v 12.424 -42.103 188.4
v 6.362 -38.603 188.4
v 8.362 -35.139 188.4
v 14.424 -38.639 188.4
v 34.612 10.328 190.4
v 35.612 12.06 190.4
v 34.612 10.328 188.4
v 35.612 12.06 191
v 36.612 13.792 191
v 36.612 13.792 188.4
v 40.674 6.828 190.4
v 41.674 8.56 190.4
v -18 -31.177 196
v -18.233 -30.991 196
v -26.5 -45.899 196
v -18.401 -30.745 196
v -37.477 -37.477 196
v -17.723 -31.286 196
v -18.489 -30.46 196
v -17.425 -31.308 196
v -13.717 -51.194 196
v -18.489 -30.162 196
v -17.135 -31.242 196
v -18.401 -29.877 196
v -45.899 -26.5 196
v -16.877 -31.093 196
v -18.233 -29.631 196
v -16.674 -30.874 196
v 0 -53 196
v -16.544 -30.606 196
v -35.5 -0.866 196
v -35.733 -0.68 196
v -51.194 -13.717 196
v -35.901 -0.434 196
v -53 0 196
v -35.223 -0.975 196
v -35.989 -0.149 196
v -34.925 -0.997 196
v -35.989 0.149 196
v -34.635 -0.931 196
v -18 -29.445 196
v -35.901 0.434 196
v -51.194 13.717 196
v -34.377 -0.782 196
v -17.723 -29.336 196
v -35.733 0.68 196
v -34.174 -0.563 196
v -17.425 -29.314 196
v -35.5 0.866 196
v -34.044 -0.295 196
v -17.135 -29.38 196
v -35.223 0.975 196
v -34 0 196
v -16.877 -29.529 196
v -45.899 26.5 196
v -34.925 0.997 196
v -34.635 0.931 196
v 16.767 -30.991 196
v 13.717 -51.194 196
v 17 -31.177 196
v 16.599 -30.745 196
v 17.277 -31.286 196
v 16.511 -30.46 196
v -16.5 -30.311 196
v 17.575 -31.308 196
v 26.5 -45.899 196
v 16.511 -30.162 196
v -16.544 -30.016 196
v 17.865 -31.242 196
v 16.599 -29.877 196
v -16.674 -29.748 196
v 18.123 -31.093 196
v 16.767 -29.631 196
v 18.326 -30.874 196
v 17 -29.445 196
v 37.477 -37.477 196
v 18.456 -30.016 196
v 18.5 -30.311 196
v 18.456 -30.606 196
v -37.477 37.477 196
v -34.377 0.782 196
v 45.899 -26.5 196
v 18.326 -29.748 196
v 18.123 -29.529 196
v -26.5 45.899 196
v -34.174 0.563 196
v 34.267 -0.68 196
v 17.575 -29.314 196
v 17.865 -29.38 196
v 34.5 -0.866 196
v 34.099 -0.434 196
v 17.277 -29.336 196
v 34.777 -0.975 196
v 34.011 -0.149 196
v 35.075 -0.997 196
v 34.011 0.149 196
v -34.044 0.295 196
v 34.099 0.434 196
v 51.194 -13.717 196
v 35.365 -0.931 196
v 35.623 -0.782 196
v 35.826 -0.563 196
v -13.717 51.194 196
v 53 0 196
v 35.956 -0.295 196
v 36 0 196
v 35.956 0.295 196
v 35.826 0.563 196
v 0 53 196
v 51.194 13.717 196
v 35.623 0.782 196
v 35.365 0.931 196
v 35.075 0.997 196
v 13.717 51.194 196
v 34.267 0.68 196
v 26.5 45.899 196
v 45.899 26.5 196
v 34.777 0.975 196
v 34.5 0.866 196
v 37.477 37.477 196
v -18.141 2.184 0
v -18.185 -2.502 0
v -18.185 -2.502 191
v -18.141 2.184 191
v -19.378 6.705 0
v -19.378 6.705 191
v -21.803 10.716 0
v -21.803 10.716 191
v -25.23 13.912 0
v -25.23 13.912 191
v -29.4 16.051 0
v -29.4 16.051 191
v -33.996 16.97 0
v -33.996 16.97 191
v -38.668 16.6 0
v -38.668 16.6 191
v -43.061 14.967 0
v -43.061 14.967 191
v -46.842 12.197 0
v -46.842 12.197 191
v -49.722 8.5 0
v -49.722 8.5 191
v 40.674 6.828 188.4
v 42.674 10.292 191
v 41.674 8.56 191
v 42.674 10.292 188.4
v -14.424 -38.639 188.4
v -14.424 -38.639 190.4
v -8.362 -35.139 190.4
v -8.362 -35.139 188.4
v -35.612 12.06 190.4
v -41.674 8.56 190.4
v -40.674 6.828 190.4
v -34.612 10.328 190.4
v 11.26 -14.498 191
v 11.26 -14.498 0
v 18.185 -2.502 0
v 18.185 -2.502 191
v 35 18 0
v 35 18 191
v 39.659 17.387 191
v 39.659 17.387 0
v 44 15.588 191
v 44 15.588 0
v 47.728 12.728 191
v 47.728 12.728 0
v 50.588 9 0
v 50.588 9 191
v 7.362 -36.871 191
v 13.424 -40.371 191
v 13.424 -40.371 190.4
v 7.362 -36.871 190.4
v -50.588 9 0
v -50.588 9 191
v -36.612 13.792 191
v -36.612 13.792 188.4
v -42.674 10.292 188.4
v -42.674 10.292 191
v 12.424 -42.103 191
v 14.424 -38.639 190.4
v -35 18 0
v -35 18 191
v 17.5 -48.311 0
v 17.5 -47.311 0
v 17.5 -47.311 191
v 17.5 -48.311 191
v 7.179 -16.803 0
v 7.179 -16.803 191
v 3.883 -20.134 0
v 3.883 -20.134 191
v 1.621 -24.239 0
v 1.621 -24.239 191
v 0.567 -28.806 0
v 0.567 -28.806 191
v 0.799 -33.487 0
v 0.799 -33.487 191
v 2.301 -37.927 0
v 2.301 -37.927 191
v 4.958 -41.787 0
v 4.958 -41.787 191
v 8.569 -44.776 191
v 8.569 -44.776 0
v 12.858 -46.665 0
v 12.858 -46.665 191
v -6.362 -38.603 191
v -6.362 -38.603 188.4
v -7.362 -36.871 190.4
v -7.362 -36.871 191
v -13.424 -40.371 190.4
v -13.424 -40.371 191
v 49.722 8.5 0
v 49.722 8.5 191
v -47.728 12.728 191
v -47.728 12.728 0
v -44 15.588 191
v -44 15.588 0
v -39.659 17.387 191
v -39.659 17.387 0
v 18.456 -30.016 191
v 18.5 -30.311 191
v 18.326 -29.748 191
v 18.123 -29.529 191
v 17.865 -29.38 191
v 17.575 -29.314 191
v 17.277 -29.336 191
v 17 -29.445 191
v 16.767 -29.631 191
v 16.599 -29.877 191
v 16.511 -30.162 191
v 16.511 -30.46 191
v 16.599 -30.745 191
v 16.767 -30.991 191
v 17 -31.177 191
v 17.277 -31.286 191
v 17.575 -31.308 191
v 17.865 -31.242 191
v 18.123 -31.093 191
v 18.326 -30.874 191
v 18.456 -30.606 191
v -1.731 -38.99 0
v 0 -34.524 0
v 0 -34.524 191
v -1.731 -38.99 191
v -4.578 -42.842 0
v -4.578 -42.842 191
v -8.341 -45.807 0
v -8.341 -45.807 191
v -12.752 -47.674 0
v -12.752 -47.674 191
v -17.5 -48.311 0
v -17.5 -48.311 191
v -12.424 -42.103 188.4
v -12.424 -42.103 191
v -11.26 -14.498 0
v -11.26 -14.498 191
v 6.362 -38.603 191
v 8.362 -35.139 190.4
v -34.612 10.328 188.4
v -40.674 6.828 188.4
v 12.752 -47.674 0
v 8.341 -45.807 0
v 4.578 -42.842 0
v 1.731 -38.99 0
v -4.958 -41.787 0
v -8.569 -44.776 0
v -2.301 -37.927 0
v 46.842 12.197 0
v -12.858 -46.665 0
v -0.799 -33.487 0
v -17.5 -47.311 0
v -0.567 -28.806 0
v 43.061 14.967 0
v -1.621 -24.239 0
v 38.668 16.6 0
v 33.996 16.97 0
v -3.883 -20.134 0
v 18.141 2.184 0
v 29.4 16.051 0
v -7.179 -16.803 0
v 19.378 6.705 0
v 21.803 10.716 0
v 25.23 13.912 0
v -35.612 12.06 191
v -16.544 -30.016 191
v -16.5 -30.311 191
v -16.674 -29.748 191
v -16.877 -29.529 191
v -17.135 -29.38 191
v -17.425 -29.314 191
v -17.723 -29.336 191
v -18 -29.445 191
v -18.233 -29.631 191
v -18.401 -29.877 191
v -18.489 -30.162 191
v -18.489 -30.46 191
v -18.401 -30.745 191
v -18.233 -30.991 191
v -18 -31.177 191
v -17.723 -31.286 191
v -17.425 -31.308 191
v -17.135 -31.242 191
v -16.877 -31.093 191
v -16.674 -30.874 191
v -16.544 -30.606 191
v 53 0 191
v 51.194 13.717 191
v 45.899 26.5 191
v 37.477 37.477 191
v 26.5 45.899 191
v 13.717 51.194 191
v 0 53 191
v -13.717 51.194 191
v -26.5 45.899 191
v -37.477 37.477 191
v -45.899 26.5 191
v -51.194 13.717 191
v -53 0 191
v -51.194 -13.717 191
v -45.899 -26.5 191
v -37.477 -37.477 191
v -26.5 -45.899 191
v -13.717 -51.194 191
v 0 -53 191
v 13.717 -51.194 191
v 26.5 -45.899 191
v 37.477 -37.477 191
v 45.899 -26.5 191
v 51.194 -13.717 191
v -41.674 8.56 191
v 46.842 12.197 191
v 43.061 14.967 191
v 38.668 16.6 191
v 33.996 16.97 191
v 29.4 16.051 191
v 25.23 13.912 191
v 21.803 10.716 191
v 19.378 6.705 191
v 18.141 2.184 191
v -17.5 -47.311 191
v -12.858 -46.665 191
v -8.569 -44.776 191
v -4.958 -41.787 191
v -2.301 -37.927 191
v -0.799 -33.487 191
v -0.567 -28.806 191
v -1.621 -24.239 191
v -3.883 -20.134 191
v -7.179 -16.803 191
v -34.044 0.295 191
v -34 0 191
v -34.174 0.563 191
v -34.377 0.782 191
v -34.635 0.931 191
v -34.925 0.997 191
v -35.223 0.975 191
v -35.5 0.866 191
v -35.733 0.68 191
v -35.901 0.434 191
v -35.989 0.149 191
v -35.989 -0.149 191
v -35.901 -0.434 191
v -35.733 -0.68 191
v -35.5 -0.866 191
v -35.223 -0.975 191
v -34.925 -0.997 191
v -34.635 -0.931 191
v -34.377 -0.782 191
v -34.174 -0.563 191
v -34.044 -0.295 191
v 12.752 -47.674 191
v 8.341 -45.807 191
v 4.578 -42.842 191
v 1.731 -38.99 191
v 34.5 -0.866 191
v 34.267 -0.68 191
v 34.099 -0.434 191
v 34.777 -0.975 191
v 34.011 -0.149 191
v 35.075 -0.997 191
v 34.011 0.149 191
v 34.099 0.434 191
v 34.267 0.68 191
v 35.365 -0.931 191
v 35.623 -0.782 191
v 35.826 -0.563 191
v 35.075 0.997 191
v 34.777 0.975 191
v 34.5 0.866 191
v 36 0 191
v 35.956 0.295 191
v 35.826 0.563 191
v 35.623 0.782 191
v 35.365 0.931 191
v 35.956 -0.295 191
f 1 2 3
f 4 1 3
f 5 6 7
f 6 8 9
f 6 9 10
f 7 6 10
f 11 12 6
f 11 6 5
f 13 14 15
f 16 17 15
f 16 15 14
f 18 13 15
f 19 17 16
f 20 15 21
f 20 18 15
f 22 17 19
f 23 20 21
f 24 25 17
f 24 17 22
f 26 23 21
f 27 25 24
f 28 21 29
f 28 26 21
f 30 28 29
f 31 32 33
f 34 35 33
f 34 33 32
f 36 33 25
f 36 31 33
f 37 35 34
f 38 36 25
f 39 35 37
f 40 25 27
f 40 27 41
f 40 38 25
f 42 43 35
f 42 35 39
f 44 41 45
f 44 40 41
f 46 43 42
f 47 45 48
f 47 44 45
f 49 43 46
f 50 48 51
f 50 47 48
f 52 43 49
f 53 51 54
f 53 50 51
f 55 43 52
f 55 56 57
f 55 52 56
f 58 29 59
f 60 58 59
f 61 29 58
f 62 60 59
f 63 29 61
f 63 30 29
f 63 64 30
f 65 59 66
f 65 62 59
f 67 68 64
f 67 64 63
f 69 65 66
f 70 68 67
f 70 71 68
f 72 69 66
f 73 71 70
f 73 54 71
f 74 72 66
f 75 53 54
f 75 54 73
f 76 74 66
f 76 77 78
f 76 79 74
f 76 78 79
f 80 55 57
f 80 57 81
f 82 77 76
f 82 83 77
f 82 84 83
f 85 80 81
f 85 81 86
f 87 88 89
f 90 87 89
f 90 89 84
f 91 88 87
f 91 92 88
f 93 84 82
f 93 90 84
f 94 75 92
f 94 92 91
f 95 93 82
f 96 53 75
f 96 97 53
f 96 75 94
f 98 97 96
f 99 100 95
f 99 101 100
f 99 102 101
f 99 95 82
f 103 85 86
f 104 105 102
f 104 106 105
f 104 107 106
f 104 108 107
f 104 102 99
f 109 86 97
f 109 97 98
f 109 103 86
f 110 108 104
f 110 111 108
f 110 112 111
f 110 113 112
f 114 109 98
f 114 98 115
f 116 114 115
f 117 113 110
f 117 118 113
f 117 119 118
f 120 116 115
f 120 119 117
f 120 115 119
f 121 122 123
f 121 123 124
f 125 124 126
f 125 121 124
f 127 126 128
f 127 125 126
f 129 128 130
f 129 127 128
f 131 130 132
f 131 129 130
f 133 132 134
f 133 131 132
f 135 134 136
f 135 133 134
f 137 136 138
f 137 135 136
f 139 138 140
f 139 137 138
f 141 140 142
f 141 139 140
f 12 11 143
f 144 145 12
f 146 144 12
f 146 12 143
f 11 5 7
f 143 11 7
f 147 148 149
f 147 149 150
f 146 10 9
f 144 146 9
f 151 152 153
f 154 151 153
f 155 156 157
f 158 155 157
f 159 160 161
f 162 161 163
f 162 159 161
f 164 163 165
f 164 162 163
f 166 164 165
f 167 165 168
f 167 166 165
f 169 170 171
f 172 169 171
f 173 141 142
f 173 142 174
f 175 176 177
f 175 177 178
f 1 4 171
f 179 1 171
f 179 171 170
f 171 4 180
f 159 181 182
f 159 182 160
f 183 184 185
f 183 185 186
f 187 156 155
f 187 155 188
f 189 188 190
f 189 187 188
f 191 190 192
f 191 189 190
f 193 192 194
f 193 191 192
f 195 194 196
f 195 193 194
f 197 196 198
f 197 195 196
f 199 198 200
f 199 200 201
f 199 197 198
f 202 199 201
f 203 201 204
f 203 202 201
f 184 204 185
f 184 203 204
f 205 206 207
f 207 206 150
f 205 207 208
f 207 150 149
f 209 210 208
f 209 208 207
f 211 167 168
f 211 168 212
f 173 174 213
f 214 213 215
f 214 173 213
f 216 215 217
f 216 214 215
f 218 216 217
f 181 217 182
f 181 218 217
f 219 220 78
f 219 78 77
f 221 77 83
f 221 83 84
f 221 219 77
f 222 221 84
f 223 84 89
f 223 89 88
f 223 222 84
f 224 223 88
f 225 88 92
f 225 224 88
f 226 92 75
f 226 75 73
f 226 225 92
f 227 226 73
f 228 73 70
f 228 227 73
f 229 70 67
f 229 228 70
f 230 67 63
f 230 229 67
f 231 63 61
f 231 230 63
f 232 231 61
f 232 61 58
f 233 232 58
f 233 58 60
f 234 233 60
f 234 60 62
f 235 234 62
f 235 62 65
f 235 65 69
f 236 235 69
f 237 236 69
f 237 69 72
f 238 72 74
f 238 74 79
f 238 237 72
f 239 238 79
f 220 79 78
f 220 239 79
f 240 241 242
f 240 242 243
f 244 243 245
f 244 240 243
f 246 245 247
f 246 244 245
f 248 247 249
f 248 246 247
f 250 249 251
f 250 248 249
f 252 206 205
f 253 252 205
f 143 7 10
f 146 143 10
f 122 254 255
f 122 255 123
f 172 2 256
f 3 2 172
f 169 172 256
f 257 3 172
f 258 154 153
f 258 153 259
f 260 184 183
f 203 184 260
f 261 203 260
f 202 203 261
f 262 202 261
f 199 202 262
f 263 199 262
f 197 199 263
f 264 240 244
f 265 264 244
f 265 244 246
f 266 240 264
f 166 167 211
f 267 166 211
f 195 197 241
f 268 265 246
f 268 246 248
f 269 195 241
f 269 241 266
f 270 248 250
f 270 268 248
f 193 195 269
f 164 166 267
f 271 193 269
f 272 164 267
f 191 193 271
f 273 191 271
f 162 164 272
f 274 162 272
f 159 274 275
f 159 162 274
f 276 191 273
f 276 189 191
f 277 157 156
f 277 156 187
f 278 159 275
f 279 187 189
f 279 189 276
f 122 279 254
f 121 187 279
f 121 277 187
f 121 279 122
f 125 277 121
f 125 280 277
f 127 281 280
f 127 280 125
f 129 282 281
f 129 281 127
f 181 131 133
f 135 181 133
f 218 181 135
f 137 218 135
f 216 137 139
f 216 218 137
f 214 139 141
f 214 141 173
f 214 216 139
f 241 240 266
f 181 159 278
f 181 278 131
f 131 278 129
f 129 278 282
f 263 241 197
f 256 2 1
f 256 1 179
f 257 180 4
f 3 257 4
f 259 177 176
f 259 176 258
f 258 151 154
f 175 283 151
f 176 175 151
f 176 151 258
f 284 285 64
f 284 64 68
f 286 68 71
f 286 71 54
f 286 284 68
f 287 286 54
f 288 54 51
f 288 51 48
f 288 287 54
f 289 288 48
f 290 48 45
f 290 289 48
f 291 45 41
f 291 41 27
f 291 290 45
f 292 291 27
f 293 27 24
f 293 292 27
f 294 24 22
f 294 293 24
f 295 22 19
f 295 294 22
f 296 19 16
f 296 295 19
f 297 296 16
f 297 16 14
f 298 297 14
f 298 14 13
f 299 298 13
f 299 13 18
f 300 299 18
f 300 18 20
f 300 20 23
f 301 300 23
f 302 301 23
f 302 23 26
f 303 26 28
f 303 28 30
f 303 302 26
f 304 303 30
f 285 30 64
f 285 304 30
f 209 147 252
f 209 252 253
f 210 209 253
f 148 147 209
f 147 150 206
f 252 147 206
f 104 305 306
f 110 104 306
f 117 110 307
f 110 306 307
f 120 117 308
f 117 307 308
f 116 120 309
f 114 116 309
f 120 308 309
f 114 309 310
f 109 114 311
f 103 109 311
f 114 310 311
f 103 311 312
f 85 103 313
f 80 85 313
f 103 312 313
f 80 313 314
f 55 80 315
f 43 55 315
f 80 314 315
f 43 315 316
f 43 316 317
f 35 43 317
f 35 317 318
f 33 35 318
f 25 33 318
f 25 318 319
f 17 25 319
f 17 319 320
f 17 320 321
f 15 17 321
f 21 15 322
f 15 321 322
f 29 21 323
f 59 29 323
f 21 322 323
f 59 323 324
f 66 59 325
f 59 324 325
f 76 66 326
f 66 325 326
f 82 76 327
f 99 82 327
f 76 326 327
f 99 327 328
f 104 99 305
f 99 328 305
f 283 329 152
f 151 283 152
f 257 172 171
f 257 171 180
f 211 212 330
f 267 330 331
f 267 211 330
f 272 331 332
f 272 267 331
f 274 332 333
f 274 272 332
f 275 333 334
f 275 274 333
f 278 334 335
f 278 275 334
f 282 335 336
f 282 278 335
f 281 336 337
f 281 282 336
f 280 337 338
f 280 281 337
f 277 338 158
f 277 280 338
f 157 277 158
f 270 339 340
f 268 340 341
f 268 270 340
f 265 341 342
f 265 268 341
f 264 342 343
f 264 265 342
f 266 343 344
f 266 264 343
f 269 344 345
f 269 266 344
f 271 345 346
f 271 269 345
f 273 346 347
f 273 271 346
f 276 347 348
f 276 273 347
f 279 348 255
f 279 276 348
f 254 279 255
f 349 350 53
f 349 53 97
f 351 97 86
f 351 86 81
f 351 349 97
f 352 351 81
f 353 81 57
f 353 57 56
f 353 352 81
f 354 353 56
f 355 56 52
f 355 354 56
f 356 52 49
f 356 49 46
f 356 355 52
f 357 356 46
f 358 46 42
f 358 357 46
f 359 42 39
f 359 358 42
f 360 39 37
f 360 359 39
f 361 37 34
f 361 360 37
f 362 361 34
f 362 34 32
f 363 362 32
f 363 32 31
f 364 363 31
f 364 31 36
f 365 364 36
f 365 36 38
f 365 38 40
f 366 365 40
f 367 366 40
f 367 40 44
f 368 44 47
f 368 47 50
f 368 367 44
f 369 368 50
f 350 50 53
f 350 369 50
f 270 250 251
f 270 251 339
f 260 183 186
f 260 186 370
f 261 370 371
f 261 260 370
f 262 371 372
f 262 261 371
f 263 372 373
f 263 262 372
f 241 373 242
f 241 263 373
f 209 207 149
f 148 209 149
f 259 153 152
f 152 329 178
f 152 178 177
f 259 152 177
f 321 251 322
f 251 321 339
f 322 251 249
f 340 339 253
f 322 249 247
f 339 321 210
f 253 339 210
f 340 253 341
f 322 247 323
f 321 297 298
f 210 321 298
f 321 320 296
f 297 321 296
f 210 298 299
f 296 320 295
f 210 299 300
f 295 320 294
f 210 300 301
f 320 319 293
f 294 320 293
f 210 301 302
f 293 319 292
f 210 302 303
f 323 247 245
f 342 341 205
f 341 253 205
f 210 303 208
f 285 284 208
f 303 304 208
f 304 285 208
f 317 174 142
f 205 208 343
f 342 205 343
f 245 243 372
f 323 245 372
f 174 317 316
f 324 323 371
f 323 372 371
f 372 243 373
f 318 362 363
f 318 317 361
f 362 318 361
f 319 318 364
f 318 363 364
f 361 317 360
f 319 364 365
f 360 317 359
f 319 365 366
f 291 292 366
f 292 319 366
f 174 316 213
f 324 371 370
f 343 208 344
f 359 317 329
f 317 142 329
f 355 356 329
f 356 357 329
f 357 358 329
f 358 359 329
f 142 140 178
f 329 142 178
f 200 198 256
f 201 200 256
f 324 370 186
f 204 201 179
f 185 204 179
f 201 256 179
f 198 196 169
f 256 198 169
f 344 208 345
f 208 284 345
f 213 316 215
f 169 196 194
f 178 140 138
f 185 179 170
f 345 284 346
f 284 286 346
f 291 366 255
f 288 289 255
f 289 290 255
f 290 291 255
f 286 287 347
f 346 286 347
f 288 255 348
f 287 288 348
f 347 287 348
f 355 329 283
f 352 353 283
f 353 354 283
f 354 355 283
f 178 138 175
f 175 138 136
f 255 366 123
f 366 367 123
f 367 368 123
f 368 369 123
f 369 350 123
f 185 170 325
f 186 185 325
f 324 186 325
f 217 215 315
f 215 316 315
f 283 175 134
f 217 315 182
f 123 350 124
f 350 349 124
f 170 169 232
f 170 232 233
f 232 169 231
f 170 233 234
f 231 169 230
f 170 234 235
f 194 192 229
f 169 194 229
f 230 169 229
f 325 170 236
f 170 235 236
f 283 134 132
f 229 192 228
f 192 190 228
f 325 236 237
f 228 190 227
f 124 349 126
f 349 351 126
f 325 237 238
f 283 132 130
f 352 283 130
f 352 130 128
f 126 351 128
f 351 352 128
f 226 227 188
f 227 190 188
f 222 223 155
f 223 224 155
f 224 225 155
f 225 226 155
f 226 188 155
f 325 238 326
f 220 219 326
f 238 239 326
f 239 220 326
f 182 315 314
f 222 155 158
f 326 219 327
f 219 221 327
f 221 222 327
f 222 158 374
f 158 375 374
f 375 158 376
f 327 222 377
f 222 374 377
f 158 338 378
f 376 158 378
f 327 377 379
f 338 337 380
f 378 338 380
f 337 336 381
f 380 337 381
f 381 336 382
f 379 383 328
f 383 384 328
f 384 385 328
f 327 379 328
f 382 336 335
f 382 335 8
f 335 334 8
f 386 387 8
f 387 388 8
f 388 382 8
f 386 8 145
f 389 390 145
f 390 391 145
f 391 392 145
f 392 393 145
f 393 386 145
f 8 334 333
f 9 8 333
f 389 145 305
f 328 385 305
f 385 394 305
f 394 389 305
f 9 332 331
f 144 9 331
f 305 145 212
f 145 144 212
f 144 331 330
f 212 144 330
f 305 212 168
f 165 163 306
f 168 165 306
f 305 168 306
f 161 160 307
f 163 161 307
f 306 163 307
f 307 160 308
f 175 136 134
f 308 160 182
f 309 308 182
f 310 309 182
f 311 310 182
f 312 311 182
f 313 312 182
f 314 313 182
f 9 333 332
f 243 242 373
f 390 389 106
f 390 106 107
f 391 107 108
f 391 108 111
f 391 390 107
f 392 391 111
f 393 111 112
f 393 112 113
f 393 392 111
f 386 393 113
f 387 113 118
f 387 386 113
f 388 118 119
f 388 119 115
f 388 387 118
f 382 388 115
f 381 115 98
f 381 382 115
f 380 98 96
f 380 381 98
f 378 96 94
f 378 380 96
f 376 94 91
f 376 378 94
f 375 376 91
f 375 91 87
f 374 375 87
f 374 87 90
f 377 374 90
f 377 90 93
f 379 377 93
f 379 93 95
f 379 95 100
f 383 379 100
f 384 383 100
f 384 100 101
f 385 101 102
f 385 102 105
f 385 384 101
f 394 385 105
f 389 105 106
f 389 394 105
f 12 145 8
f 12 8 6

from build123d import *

# Parameters (mm, degrees)
BOSS_EXTRU_1_DEPTH      = 191
ENL_V_MAT_EXTRU_1_DEPTH = 204.406327378
ESQUISSE2_R             = 53
ESQUISSE2_R_2           = 1
BOSS_EXTRU_2_DEPTH      = 5
BOSS_EXTRU_3_DEPTH      = 7
BOSS_EXTRU_4_DEPTH      = 7


with BuildPart() as part:
    # Esquisse1 → Boss.-Extru.1 (new body)
    with BuildSketch(Plane.XY):
        with BuildLine():
            Line((-17.5, -48.310889132), (-17.5, -47.310889132))
            ThreePointArc((-17.5, -47.310889132), (-9, -15.588457268), (-32.222431864, -38.810889132))
            Line((-32.222431864, -38.810889132), (-33.088457268, -39.310889132))
            ThreePointArc((-33.088457268, -39.310889132), (-35.314540075, -27.733649929), (-29.89862988, -17.26198201))
            ThreePointArc((-29.89862988, -17.26198201), (-41.675315415, -16.716463864), (-50.588457268, -9))
            Line((-50.588457268, -9), (-49.722431864, -8.5))
            ThreePointArc((-49.722431864, -8.5), (-18, 0), (-49.722431864, 8.5))
            Line((-49.722431864, 8.5), (-50.588457268, 9))
            ThreePointArc((-50.588457268, 9), (-44, 15.588457268), (-35, 18))
            Line((-35, 18), (35, 18))
            ThreePointArc((35, 18), (44, 15.588457268), (50.588457268, 9))
            Line((50.588457268, 9), (49.722431864, 8.5))
            ThreePointArc((49.722431864, 8.5), (18, 0), (49.722431864, -8.5))
            Line((49.722431864, -8.5), (50.588457268, -9))
            ThreePointArc((50.588457268, -9), (41.675315415, -16.716463864), (29.89862988, -17.26198201))
            ThreePointArc((29.89862988, -17.26198201), (35.314540075, -27.733649929), (33.088457268, -39.310889132))
            Line((33.088457268, -39.310889132), (32.222431864, -38.810889132))
            ThreePointArc((32.222431864, -38.810889132), (9, -15.588457268), (17.5, -47.310889132))
            Line((17.5, -47.310889132), (17.5, -48.310889132))
            ThreePointArc((17.5, -48.310889132), (6.36077534, -44.450113792), (0, -34.523964019))
            ThreePointArc((0, -34.523964019), (-6.36077534, -44.450113792), (-17.5, -48.310889132))
        make_face()
    extrude(amount=BOSS_EXTRU_1_DEPTH)

    # Esquisse4 → Enlèv. mat.-Extru.1 (cut, through all)
    with BuildSketch(Plane.XY.offset(191)):
        Polygon((11.259686126, -14.497651553), (18.185177603, -2.502348447), (49.722431864, -8.5), (50.588457268, -9), (33.088457268, -39.310889132), (32.222431864, -38.810889132), align=None)
        Polygon((-33.088457268, -39.310889132), (-32.222431864, -38.810889132), (-11.259686126, -14.497651553), (-18.185177603, -2.502348447), (-49.722431864, -8.5), (-50.588457268, -9), align=None)
    extrude(amount=-ENL_V_MAT_EXTRU_1_DEPTH, mode=Mode.SUBTRACT)

    # Esquisse2 → Boss.-Extru.2 (add)
    with BuildSketch(Plane.XY.offset(191)):
        Circle(ESQUISSE2_R)
        with Locations((-35, 0)):
            Circle(ESQUISSE2_R_2, mode=Mode.SUBTRACT)
        with Locations((-17.5, -30.310889132)):
            Circle(ESQUISSE2_R_2, mode=Mode.SUBTRACT)
        with Locations((17.5, -30.310889132)):
            Circle(ESQUISSE2_R_2, mode=Mode.SUBTRACT)
        with Locations((35, 0)):
            Circle(ESQUISSE2_R_2, mode=Mode.SUBTRACT)
        Polygon((41.674038106, 8.559773091), (35.611860279, 12.059773091), (36.611860279, 13.791823898), (42.674038106, 10.291823898), align=None, mode=Mode.SUBTRACT)
        Polygon((7.361860279, -36.870662223), (6.361860279, -38.602713031), (12.424038106, -42.102713031), (13.424038106, -40.370662223), align=None, mode=Mode.SUBTRACT)
        Polygon((-35.611860279, 12.059773091), (-36.611860279, 13.791823898), (-42.674038106, 10.291823898), (-41.674038106, 8.559773091), align=None, mode=Mode.SUBTRACT)
        Polygon((-7.361860279, -36.870662223), (-6.361860279, -38.602713031), (-12.424038106, -42.102713031), (-13.424038106, -40.370662223), align=None, mode=Mode.SUBTRACT)
    extrude(amount=BOSS_EXTRU_2_DEPTH)

    # Esquisse5 → Boss.-Extru.3 (add)
    with BuildSketch(Plane(origin=(21.486860279, -12.405444566, 0), x_dir=(0, 0, -1), z_dir=(0.8660254037844384, -0.5000000000000006, 0))):
        Polygon((-196, -28.25), (-190.4, -28.25), (-190.4, -26.25), (-188.4, -26.25), (-188.4, -28.25), (-188.4, -30.25), (-196, -30.25), align=None)
        Polygon((-190.4, 26.25), (-188.4, 26.25), (-188.4, 28.25), (-188.4, 30.25), (-196, 30.25), (-196, 28.25), (-190.4, 28.25), align=None)
    extrude(amount=BOSS_EXTRU_3_DEPTH)

    # Esquisse6 → Boss.-Extru.4 (add)
    with BuildSketch(Plane(origin=(-21.486860279, -12.405444566, 0), x_dir=(0, 0, 1), z_dir=(-0.8660254037844384, -0.5000000000000006, 0))):
        Polygon((196, -28.25), (190.4, -28.25), (190.4, -26.25), (188.4, -26.25), (188.4, -28.25), (188.4, -30.25), (196, -30.25), align=None)
        Polygon((190.4, 26.25), (188.4, 26.25), (188.4, 28.25), (188.4, 30.25), (196, 30.25), (196, 28.25), (190.4, 28.25), align=None)
    extrude(amount=BOSS_EXTRU_4_DEPTH)


solid = part.part
